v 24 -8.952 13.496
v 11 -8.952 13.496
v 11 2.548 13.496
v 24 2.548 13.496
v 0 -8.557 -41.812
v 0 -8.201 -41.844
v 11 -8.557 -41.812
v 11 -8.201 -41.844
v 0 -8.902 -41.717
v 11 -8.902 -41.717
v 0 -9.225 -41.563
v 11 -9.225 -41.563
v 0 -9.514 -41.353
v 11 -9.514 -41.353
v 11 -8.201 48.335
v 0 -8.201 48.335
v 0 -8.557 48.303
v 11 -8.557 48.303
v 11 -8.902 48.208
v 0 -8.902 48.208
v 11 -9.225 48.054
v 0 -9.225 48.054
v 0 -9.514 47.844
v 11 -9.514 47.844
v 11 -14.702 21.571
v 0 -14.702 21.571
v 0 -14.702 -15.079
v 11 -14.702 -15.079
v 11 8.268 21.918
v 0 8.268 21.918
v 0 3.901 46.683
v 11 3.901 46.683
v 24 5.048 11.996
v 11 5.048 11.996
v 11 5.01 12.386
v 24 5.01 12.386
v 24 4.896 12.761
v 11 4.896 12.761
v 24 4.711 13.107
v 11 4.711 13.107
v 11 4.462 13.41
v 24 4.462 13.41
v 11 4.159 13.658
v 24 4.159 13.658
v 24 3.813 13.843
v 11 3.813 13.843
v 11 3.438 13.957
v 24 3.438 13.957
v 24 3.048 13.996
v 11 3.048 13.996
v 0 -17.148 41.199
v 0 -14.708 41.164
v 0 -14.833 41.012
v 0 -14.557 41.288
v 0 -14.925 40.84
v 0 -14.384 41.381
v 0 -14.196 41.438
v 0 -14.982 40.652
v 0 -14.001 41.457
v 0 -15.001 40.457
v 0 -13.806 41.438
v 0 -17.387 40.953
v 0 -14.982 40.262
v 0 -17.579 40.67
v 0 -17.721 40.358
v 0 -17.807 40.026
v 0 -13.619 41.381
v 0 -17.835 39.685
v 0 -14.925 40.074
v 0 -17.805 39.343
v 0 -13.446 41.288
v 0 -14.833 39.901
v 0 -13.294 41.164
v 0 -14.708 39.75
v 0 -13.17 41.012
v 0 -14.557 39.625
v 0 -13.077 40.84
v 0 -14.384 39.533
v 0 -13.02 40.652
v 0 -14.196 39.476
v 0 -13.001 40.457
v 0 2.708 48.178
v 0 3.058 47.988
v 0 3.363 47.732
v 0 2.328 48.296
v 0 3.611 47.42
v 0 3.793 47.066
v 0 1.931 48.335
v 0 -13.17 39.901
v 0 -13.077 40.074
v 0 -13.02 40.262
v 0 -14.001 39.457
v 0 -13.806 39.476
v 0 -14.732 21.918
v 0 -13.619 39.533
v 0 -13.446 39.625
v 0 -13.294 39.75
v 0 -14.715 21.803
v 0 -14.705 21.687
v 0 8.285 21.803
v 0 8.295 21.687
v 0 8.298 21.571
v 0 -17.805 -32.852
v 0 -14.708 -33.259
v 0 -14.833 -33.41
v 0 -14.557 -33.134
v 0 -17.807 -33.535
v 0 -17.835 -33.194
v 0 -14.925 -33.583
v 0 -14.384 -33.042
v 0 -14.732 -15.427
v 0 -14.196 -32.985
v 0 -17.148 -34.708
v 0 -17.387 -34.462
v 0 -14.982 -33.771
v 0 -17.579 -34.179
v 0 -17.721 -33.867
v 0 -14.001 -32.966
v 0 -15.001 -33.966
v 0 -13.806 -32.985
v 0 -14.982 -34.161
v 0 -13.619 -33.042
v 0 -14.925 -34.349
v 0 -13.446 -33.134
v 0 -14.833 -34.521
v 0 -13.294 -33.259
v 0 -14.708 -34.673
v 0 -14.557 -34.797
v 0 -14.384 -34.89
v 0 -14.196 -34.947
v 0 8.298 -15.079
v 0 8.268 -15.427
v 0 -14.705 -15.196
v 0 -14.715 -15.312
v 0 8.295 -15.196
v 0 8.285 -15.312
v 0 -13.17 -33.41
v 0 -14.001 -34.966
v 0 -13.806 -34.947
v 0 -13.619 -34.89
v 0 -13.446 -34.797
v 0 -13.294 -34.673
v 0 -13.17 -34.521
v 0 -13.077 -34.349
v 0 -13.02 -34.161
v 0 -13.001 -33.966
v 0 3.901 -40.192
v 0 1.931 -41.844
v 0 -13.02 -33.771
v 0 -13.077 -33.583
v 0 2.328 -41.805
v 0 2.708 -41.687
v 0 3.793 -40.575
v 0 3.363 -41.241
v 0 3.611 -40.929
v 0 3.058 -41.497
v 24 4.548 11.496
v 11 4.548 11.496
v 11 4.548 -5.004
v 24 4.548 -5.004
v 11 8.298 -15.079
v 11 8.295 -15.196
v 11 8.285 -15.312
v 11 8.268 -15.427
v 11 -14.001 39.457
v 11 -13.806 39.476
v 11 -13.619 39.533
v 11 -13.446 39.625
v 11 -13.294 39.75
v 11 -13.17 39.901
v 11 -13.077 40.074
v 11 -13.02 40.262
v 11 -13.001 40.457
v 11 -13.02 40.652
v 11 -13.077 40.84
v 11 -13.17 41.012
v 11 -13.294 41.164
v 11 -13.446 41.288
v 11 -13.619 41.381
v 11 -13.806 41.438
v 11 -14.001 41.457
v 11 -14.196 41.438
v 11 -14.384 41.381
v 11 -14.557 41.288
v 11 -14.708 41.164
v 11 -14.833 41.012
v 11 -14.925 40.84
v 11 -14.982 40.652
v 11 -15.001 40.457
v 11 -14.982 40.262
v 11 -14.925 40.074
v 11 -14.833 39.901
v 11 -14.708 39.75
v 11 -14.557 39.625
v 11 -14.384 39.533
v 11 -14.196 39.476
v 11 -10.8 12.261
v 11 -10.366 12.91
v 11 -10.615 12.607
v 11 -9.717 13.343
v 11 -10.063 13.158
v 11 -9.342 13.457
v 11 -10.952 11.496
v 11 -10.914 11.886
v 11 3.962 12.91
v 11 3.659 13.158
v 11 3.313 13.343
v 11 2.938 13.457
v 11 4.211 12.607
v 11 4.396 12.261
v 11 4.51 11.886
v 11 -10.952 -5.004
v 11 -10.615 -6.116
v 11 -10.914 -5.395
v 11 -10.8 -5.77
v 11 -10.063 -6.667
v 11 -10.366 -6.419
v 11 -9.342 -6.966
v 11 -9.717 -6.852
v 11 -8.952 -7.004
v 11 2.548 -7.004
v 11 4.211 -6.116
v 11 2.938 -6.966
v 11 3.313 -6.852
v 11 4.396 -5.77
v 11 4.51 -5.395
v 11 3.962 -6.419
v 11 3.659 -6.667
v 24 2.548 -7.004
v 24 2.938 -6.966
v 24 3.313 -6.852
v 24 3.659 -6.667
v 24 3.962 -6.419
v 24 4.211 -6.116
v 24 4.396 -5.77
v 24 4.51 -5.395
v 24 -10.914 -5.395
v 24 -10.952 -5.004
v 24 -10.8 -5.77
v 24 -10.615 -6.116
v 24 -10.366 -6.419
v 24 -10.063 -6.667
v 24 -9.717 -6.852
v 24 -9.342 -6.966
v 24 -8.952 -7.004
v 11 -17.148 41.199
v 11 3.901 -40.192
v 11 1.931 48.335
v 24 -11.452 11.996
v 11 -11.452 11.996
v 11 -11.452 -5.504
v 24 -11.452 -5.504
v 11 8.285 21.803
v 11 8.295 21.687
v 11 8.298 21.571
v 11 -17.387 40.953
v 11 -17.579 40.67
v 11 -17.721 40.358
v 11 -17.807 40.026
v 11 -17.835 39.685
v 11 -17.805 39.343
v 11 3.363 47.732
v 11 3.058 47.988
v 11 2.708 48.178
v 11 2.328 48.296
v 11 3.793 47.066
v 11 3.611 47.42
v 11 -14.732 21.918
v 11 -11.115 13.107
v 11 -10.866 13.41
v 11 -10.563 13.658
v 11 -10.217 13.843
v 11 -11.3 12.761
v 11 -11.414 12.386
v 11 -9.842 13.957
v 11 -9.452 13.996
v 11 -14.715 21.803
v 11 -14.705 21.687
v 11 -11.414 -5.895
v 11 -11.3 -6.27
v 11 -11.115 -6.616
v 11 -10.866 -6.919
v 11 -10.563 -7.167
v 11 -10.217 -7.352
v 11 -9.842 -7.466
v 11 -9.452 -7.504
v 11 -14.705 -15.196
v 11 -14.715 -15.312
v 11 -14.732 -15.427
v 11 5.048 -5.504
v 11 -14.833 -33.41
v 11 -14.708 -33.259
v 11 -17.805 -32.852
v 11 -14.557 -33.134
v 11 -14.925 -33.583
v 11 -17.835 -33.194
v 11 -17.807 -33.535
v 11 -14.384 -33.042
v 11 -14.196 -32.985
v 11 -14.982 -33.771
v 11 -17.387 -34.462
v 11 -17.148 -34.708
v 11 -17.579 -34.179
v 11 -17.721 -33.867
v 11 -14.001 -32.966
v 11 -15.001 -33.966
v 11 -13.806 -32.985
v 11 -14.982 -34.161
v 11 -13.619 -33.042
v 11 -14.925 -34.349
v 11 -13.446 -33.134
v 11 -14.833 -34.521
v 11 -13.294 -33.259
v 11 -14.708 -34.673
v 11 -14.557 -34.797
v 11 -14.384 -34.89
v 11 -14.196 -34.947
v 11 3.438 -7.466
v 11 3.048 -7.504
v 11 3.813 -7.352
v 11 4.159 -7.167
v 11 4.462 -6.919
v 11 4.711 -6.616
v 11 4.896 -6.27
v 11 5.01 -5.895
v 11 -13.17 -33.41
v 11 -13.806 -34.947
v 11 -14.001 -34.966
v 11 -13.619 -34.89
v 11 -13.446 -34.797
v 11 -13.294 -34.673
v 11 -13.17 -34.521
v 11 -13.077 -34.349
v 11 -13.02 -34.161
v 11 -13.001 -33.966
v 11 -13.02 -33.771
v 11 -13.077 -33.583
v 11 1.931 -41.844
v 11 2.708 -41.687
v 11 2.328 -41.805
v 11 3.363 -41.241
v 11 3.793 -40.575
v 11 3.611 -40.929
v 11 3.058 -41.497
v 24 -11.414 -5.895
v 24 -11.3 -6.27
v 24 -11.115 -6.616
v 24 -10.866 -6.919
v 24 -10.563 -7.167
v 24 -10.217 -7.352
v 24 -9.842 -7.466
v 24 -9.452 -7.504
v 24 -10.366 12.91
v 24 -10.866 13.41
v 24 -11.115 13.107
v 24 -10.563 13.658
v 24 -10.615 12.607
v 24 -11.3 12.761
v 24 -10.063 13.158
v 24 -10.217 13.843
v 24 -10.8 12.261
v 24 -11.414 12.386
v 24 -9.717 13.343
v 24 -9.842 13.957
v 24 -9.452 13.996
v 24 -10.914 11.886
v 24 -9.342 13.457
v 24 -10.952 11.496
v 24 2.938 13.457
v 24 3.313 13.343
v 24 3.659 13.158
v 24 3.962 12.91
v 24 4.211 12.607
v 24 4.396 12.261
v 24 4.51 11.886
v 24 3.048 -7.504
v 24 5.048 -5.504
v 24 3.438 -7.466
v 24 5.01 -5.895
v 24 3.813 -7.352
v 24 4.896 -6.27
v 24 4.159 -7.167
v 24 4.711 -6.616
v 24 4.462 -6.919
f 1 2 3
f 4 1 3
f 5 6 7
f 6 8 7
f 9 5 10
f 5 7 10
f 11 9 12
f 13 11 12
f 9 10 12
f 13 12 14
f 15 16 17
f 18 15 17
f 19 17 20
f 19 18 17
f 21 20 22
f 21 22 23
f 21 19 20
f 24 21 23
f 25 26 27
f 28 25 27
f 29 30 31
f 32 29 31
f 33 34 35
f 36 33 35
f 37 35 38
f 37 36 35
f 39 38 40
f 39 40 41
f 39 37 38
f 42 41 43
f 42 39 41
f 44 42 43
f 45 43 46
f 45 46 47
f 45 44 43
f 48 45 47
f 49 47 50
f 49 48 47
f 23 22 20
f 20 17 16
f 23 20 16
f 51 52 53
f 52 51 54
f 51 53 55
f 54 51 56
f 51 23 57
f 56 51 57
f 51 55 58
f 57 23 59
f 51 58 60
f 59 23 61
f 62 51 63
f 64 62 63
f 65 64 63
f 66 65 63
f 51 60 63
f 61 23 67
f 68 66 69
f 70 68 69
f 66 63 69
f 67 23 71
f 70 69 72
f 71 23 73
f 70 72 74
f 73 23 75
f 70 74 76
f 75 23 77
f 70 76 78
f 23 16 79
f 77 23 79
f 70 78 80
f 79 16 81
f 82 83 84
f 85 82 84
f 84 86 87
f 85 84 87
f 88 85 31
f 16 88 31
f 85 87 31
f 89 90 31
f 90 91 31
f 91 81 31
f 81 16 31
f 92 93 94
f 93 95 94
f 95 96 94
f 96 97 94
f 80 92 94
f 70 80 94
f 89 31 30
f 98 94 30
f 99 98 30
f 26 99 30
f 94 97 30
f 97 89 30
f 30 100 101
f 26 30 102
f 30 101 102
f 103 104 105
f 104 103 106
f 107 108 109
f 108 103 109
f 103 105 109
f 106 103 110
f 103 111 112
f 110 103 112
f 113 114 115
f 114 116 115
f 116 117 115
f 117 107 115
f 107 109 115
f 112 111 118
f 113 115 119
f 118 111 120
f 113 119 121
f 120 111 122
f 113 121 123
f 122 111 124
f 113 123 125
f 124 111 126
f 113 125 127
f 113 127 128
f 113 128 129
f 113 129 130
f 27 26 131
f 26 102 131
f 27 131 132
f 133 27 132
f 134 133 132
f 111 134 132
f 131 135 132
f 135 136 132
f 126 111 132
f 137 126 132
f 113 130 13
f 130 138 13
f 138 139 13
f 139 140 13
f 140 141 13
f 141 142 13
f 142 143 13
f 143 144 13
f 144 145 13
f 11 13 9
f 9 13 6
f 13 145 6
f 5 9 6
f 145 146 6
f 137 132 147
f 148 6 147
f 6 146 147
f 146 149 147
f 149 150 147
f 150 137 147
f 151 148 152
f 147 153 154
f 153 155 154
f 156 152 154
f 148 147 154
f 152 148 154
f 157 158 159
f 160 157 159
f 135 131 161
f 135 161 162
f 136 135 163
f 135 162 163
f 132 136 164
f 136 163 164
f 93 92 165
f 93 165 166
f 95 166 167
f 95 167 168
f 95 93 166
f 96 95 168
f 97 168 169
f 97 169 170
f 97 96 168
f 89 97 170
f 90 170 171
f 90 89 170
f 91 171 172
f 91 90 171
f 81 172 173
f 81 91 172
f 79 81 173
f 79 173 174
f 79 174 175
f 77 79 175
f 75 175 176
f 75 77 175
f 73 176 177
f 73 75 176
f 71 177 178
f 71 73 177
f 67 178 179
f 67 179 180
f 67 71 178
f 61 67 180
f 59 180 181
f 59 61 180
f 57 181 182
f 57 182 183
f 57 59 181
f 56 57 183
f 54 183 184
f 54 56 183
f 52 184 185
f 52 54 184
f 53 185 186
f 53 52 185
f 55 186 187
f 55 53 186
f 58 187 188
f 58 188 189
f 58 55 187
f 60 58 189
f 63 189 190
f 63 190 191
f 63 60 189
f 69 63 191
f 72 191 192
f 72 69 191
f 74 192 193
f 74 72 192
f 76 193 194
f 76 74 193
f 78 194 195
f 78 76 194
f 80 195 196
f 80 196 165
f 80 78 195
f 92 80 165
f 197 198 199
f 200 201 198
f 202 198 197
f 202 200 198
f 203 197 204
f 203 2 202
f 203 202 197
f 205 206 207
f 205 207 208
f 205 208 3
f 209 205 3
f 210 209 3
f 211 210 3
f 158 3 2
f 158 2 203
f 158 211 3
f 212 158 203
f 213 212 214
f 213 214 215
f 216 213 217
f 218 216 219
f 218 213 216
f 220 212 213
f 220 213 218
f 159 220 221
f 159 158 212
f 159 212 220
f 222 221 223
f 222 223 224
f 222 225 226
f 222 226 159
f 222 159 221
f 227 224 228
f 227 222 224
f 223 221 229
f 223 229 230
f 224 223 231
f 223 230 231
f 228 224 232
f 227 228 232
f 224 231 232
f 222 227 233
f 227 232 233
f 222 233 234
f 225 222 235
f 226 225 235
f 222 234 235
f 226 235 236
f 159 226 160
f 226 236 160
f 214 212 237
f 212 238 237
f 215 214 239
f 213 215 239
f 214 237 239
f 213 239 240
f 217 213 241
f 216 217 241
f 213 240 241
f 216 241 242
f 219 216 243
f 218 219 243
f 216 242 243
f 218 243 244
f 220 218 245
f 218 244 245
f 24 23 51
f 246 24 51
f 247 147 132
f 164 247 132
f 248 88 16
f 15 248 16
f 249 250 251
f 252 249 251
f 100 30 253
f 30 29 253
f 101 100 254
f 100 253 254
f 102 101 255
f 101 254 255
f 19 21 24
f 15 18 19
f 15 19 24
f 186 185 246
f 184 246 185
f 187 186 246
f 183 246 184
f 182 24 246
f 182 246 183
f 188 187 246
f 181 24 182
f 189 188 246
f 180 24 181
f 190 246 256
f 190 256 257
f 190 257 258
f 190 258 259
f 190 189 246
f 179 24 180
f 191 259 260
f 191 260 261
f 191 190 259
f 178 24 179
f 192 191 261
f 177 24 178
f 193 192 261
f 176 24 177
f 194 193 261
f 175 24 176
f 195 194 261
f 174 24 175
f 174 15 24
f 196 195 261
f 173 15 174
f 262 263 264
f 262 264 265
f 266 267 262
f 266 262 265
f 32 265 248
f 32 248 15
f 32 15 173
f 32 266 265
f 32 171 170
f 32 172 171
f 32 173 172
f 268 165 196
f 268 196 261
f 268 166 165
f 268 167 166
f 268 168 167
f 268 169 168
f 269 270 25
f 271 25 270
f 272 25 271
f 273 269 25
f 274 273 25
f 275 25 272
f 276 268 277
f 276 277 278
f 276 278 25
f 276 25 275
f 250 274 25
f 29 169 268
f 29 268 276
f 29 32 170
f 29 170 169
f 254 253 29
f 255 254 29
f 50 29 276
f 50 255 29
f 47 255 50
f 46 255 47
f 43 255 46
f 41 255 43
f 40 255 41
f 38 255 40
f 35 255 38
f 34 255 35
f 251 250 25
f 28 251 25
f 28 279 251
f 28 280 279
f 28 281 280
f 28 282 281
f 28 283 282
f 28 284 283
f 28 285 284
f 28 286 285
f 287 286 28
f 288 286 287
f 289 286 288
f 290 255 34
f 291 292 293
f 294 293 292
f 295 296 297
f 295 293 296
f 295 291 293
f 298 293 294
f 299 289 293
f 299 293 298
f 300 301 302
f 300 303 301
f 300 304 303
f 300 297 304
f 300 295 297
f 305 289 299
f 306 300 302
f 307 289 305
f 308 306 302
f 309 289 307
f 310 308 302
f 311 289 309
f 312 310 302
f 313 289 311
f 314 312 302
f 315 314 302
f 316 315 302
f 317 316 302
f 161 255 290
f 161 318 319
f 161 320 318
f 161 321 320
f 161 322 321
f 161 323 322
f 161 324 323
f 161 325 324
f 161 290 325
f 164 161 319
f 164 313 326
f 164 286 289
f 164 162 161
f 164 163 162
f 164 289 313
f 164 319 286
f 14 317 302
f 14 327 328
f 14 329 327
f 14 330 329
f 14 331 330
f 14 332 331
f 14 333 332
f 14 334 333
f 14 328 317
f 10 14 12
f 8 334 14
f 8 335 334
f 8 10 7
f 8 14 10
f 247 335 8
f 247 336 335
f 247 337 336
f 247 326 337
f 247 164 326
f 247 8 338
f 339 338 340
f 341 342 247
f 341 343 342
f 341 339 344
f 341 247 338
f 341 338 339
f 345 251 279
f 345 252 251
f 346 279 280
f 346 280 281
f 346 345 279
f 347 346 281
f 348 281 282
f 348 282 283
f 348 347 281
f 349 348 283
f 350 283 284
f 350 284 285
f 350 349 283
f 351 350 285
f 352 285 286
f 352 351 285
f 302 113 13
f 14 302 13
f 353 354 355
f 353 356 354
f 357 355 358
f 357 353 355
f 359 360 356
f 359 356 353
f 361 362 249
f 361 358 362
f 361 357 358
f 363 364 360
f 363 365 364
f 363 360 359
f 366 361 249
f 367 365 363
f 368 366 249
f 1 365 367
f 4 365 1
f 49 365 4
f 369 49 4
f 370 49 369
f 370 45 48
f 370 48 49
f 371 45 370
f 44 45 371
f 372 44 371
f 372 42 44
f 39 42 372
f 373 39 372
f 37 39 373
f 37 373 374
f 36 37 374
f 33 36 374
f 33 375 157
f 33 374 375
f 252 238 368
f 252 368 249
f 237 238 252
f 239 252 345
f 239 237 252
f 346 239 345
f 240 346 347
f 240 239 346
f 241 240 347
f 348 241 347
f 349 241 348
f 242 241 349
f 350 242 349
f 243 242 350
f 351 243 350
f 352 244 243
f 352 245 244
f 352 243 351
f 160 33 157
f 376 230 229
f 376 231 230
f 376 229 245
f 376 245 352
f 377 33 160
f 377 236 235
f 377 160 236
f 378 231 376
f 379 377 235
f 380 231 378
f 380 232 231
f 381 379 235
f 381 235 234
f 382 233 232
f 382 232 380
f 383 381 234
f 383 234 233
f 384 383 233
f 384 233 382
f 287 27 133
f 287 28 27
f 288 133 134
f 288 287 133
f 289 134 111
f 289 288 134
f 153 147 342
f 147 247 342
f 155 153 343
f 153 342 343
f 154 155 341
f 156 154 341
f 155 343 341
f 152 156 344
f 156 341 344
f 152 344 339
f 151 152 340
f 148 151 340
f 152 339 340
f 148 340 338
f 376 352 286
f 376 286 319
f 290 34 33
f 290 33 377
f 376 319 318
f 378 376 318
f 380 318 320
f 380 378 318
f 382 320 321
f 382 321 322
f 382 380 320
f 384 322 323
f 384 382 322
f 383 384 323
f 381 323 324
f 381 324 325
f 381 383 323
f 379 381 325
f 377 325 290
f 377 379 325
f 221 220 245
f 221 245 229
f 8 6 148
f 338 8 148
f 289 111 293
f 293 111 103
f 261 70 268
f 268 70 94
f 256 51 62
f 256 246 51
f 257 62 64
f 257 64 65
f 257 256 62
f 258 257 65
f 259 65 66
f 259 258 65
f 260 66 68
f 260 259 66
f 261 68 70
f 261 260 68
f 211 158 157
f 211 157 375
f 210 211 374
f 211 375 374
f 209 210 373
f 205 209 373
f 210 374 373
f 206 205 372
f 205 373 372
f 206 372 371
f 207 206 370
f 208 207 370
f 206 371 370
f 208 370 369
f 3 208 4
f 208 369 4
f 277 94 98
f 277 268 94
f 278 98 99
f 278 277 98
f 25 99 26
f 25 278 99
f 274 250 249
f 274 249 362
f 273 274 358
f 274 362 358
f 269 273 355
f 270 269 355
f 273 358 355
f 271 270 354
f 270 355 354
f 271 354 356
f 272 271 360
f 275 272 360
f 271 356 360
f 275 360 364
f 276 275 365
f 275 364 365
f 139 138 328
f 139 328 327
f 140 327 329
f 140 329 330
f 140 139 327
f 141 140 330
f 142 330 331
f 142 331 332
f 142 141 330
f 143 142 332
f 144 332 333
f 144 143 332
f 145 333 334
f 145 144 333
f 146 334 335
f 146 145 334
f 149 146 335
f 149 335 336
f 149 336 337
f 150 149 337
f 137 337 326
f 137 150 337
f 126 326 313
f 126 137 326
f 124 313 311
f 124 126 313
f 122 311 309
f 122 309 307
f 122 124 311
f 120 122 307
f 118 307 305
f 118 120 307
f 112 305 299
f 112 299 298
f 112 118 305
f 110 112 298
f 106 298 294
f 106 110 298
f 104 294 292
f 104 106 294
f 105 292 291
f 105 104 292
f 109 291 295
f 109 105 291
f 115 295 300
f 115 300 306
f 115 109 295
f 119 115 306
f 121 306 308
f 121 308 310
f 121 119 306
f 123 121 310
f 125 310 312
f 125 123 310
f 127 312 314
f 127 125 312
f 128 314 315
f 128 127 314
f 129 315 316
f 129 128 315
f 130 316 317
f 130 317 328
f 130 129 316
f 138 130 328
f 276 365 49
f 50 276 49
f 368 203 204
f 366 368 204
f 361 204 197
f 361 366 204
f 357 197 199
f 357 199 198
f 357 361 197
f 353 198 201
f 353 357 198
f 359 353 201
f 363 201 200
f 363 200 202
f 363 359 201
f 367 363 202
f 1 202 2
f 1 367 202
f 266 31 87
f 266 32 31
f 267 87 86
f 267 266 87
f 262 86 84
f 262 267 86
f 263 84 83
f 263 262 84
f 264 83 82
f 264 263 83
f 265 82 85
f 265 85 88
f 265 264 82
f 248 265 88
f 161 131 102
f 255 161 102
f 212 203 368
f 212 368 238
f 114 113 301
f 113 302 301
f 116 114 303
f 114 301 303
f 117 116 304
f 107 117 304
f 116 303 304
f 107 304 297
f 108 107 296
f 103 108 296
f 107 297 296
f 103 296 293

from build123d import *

# Parameters (mm, degrees)
SKETCH1_R           = 1
BOSS_EXTRUDE1_DEPTH = 11
SKETCH2_W           = 21.5
SKETCH2_H           = 16.5
SKETCH2_W_2         = 20.5
SKETCH2_H_2         = 15.5
EXTRUDE_THIN1_DEPTH = 13
FILLET1_R           = 2
FILLET2_R           = 2


with BuildPart() as part:
    # Sketch1 → Boss-Extrude1 (new body)
    with BuildSketch(Plane(origin=(0, 0, 0), x_dir=(0, 0, -1), z_dir=(1, 0, 0))):
        Polygon((-21.745526202, 8.298037657), (-48.335335533, 3.60953686), (-48.335335533, -8.949767561), (-40.456873509, -18.001277719), (-21.745526202, -14.701962343), (15.254473798, -14.701962343), (33.965821106, -18.001277719), (41.84428313, -8.949767561), (41.84428313, 3.60953686), (15.254473798, 8.298037657), align=None)
        with Locations((-40.456873509, -14.001277719)):
            Circle(SKETCH1_R, mode=Mode.SUBTRACT)
        with Locations((33.965821106, -14.001277719)):
            Circle(SKETCH1_R, mode=Mode.SUBTRACT)
    extrude(amount=BOSS_EXTRUDE1_DEPTH)

    # Sketch2 → Extrude-Thin1 (add)
    with BuildSketch(Plane(origin=(11, 0, 0), x_dir=(0, 0, -1), z_dir=(1, 0, 0))):
        with Locations((-3.245526202, -3.201962343)):
            Rectangle(SKETCH2_W, SKETCH2_H)
        with Locations((-3.245526202, -3.201962343)):
            Rectangle(SKETCH2_W_2, SKETCH2_H_2, mode=Mode.SUBTRACT)
    extrude(amount=EXTRUDE_THIN1_DEPTH)

    # Fillet1
    fillet1_edges = [part.edges().sort_by_distance(p)[0] for p in [
        (5.5, 8.298037657, -15.254473798),
        (5.5, 3.60953686, -41.84428313),
        (5.5, -8.949767561, -41.84428313),
        (5.5, -18.001277719, -33.965821106),
        (5.5, -14.701962343, -15.254473798),
        (5.5, -14.701962343, 21.745526202),
        (5.5, -18.001277719, 40.456873509),
        (5.5, -8.949767561, 48.335335533),
        (5.5, 3.60953686, 48.335335533),
        (5.5, 8.298037657, 21.745526202),
    ]]
    fillet(fillet1_edges, radius=FILLET1_R)

    # Fillet2
    fillet2_edges = [part.edges().sort_by_distance(p)[0] for p in [
        (17.5, -11.451962343, -7.504473798),
        (17.5, 5.048037657, -7.504473798),
        (17.5, 5.048037657, 13.995526202),
        (17.5, -11.451962343, 13.995526202),
        (17.5, 4.548037657, -7.004473798),
        (17.5, 4.548037657, 13.495526202),
        (17.5, -10.951962343, 13.495526202),
        (17.5, -10.951962343, -7.004473798),
    ]]
    fillet(fillet2_edges, radius=FILLET2_R)


solid = part.part
